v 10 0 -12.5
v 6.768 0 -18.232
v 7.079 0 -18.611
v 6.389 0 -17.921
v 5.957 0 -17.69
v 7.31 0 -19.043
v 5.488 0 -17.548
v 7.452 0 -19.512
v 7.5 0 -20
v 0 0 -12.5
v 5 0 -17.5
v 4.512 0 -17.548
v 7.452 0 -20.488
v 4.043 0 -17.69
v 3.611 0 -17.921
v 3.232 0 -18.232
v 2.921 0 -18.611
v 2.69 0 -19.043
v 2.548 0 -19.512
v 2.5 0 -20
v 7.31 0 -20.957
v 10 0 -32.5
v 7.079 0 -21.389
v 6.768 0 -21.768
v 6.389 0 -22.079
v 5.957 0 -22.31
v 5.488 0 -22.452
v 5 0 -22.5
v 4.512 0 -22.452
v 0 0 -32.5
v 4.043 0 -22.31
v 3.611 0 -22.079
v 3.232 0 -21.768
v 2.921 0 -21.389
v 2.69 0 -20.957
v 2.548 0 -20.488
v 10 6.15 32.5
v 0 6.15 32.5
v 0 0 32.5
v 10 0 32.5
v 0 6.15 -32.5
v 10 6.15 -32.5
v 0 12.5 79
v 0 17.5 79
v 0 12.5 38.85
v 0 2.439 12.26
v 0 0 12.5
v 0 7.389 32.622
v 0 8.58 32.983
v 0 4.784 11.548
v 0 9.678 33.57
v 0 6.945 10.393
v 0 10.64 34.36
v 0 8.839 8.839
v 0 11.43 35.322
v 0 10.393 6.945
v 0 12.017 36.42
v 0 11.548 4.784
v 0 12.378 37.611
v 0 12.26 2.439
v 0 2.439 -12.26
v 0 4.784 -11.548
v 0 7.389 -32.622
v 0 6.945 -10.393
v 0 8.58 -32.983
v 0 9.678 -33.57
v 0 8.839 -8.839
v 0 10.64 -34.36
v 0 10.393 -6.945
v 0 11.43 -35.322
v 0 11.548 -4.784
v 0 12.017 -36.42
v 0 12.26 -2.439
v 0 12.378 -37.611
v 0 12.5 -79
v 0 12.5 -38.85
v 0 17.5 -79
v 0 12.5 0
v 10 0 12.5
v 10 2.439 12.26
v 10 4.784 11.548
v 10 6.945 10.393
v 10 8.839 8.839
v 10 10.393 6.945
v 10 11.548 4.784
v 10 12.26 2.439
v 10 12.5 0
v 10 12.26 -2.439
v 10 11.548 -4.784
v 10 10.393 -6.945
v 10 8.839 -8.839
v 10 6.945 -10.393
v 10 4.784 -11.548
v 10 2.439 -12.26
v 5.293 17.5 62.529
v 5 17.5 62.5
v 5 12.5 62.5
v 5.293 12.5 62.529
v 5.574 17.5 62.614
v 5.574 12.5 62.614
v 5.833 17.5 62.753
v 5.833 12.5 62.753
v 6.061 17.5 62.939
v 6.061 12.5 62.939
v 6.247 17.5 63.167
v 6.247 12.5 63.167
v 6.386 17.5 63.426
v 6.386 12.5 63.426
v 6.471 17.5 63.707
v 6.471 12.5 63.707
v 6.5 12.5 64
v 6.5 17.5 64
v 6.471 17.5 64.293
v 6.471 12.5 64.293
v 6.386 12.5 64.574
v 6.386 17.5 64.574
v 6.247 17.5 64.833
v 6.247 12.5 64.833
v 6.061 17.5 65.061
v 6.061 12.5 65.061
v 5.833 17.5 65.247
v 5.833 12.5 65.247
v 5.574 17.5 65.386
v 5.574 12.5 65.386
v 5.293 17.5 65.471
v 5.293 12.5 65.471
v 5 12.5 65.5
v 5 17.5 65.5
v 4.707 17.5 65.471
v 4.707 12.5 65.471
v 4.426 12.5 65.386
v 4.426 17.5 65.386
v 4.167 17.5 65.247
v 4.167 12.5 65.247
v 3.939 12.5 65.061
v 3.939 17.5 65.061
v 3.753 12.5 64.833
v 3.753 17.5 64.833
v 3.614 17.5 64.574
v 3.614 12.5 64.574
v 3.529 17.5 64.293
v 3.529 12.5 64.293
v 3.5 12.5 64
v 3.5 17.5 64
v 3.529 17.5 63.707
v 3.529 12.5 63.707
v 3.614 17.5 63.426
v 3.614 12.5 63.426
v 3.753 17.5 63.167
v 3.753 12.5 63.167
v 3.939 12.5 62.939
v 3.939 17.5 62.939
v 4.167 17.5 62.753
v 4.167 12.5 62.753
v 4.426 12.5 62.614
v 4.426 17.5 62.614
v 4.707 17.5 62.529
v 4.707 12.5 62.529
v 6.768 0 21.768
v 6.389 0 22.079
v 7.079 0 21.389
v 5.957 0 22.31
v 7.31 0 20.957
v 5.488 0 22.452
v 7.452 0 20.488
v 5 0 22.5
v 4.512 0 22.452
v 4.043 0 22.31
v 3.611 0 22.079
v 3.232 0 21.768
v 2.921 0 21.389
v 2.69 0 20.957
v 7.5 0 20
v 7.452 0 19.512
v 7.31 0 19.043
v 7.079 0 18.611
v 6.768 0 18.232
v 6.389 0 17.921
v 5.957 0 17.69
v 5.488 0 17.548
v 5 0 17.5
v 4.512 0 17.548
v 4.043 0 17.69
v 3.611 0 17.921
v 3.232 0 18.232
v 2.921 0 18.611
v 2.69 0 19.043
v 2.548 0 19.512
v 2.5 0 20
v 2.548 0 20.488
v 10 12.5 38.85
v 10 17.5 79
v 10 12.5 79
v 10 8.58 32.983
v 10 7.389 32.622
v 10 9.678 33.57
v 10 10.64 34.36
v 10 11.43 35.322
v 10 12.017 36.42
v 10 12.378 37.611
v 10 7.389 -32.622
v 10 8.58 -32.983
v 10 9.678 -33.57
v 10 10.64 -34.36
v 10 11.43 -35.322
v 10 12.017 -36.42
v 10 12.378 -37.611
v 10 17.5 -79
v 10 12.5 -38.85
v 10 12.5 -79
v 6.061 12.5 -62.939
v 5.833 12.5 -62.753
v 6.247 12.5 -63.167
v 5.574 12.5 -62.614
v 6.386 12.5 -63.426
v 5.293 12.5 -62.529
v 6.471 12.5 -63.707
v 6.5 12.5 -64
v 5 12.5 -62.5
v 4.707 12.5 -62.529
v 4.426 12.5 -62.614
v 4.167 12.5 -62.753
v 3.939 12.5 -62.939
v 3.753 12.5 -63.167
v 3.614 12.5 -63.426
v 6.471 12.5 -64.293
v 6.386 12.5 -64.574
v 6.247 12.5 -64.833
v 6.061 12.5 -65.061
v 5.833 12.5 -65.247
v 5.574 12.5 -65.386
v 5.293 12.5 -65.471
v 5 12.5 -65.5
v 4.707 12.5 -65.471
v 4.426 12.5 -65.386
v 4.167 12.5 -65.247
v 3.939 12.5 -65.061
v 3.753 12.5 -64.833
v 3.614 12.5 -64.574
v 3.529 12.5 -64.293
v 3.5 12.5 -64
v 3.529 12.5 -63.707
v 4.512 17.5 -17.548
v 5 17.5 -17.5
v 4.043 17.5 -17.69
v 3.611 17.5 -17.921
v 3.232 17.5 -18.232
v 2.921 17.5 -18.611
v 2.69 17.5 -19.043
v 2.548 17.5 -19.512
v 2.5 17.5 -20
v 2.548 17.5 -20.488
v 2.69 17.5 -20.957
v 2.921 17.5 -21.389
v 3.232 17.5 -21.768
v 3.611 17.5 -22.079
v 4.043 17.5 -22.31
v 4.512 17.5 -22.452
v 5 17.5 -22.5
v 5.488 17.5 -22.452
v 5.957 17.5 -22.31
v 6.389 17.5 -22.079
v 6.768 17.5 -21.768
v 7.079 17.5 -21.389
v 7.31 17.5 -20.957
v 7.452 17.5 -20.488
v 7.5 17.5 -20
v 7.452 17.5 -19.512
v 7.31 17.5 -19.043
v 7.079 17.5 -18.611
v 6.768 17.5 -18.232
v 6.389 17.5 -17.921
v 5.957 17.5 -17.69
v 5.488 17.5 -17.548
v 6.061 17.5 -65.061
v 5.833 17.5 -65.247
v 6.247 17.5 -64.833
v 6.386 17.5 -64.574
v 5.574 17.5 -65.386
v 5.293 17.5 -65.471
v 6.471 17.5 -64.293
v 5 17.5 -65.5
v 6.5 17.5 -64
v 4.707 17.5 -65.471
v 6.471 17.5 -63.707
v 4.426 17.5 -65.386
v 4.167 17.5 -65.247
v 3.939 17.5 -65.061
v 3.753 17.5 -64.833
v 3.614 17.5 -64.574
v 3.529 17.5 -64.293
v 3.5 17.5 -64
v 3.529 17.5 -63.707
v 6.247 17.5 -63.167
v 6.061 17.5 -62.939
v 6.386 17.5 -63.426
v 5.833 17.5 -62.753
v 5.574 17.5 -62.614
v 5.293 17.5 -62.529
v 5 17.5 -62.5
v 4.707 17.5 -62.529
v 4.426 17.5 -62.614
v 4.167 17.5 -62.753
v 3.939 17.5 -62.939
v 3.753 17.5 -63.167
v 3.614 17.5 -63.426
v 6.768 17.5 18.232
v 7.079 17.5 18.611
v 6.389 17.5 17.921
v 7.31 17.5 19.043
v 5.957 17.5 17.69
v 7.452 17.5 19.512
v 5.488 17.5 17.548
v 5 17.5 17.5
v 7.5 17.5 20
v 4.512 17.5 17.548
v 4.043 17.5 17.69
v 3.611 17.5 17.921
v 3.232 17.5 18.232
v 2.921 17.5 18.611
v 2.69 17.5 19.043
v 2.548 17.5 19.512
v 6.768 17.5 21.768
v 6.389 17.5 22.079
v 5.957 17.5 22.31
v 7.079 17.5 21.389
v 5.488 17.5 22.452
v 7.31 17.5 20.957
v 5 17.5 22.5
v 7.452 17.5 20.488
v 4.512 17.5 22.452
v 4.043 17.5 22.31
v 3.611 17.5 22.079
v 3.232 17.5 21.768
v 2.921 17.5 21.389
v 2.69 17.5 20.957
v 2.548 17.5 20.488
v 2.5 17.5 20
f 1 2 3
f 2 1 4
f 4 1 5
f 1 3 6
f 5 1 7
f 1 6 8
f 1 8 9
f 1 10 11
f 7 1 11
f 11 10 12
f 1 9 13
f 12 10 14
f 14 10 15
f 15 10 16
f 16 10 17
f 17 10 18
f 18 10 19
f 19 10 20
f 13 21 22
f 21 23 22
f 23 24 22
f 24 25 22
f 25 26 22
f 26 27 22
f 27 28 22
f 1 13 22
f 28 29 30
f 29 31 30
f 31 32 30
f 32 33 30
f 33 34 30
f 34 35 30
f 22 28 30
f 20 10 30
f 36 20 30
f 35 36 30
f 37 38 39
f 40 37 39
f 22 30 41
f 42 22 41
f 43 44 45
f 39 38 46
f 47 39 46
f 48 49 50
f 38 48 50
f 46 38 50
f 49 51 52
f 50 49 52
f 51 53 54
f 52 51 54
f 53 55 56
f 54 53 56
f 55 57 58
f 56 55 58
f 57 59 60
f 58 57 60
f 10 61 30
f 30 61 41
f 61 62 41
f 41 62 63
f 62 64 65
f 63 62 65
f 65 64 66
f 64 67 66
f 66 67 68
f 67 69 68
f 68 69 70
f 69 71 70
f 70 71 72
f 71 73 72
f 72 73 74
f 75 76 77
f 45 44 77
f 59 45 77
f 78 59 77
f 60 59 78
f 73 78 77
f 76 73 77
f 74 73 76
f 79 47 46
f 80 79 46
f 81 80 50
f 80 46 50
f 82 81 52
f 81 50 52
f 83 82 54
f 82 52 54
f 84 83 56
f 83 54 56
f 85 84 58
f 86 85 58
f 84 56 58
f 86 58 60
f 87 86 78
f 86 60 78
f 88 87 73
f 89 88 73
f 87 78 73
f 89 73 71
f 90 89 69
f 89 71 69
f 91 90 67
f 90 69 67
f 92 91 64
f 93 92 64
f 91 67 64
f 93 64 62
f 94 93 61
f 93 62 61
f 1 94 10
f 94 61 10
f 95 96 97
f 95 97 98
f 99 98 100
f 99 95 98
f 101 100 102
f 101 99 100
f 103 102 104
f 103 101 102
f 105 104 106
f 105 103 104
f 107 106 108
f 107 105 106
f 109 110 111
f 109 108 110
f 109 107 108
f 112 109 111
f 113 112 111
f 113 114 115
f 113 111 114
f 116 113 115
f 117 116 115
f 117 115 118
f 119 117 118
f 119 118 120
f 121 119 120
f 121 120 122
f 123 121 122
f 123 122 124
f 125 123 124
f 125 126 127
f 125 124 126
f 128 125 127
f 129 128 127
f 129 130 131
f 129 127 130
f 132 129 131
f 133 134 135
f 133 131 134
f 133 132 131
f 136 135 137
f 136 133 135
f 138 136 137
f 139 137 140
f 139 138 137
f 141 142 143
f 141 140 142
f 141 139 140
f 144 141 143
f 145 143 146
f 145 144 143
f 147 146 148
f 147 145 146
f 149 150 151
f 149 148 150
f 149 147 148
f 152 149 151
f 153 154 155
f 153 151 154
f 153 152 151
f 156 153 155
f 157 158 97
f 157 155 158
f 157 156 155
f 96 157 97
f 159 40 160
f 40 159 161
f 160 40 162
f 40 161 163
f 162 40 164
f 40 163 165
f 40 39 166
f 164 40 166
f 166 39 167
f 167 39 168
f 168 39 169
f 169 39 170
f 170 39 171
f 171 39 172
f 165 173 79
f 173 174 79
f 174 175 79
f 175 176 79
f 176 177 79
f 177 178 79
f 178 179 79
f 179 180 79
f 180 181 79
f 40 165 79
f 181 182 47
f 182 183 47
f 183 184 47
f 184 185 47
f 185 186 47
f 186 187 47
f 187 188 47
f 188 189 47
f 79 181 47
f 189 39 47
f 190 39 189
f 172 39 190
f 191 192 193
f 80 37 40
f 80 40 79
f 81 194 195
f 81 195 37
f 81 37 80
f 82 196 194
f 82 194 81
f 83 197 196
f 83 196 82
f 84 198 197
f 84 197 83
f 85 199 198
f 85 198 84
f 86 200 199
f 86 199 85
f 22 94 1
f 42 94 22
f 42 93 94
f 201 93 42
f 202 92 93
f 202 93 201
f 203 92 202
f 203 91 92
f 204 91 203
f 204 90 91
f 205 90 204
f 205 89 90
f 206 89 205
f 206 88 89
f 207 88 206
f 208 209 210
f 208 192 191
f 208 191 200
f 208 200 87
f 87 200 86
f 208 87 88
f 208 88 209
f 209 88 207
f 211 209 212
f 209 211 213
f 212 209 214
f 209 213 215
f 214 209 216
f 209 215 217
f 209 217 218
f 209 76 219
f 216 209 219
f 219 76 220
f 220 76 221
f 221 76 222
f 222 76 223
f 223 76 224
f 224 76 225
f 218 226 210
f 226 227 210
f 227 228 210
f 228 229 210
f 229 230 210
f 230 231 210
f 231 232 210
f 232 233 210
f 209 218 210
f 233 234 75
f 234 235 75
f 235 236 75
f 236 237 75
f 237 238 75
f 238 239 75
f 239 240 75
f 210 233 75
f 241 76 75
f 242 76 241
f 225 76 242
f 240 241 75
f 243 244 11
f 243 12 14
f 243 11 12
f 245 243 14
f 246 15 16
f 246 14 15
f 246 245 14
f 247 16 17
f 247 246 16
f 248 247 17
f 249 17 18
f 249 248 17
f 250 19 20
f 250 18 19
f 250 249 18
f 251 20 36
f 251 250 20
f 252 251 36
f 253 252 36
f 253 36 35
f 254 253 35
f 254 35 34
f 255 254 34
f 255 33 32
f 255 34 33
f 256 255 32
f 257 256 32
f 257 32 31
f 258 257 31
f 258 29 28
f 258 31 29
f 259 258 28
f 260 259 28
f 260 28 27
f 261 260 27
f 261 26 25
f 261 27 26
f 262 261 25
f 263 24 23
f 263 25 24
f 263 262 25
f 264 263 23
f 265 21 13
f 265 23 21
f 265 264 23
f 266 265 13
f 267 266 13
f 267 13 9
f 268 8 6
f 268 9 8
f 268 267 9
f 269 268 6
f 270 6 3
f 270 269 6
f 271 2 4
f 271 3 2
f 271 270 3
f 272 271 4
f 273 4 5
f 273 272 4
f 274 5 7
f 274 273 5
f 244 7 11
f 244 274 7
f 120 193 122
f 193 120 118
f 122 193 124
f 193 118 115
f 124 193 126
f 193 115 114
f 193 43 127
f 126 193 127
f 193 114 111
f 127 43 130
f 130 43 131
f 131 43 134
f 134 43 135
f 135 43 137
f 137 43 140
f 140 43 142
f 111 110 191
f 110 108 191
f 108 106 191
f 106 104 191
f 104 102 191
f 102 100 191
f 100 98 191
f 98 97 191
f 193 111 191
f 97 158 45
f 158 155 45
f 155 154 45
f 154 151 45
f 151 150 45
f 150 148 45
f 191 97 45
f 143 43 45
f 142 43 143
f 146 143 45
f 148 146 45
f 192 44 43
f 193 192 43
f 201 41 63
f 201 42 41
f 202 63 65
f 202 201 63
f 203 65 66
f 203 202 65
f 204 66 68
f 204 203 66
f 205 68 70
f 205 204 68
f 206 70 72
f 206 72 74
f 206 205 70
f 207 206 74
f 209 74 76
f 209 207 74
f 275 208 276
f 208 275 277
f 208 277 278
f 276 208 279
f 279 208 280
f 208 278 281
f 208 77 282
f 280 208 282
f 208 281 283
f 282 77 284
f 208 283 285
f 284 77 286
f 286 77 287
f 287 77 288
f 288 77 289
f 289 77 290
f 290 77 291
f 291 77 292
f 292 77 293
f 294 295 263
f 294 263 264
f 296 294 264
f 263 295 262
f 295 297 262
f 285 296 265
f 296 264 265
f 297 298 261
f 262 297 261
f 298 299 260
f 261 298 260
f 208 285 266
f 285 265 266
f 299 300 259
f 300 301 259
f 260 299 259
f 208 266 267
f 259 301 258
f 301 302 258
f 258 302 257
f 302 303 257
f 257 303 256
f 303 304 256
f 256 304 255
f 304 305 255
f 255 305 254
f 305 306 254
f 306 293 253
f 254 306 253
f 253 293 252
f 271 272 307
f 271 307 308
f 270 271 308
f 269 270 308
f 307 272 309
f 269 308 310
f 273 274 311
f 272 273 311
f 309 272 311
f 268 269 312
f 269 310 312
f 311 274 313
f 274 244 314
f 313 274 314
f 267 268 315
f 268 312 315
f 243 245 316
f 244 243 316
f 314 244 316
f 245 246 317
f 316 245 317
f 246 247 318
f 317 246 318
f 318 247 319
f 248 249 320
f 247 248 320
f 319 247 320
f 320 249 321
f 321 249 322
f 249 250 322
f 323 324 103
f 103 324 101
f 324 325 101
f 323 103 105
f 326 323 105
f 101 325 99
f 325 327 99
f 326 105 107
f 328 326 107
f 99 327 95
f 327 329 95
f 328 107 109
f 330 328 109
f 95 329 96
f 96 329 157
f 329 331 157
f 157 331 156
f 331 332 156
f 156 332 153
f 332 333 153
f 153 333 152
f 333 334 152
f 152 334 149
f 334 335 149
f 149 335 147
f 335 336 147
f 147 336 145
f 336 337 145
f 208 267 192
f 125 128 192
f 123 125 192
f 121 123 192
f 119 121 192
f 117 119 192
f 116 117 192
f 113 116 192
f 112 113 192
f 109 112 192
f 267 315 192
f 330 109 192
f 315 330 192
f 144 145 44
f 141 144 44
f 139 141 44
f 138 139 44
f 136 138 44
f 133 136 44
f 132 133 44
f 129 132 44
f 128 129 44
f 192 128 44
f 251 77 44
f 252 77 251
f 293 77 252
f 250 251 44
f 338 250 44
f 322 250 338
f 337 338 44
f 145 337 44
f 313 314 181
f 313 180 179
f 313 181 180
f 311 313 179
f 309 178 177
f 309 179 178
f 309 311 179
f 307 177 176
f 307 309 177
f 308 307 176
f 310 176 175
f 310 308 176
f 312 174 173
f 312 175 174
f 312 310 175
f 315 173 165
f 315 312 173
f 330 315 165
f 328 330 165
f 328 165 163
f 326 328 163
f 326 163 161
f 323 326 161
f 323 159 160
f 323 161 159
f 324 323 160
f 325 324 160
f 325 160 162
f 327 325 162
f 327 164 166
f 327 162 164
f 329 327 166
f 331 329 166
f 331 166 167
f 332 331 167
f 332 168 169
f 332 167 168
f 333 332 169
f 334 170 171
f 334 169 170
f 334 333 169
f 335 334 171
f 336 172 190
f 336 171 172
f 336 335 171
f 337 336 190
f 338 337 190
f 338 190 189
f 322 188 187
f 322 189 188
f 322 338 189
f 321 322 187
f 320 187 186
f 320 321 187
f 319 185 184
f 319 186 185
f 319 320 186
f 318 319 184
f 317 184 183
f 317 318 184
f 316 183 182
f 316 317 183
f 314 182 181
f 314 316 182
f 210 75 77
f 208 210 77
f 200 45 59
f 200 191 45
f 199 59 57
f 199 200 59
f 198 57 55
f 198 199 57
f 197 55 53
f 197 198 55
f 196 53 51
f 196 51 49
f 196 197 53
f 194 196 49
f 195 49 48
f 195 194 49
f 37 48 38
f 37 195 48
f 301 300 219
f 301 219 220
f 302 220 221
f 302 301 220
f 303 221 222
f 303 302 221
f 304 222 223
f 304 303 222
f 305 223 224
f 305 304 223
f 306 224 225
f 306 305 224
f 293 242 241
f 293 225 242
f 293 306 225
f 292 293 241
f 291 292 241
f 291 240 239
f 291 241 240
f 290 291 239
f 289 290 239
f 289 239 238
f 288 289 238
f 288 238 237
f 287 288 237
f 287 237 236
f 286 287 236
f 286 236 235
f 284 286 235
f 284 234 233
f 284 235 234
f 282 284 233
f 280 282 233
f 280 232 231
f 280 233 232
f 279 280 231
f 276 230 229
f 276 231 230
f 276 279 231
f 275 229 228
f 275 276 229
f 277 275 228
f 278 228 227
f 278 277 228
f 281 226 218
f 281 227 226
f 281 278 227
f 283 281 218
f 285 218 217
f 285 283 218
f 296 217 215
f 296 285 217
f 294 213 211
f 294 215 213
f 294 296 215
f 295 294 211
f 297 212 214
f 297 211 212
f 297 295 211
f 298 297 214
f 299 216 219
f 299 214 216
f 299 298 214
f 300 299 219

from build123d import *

# Parameters (mm, degrees)
BOSS_EXTRUDE1_DEPTH     = 10
CUT_EXTRUDE1_DEPTH      = 81.605520903
CUT_EXTRUDE1_DEPTH_BACK = 81.605520903
SKETCH2_R               = 1.5
SKETCH2_R_2             = 2.5
FILLET1_R               = 6.35


with BuildPart() as part:
    # Sketch1 → Boss-Extrude1 (new body)
    with BuildSketch(Plane(origin=(0, 0, 0), x_dir=(0, 0, -1), z_dir=(1, 0, 0))):
        with BuildLine():
            Line((-79, 12.5), (-32.5, 12.5))
            Line((-32.5, 12.5), (-32.5, 0))
            Line((-32.5, 0), (-12.5, 0))
            ThreePointArc((-12.5, 0), (0, 12.5), (12.5, 0))
            Line((12.5, 0), (32.5, 0))
            Line((32.5, 0), (32.5, 12.5))
            Line((32.5, 12.5), (79, 12.5))
            Line((79, 12.5), (79, 17.5))
            Line((79, 17.5), (-79, 17.5))
            Line((-79, 17.5), (-79, 12.5))
        make_face()
    extrude(amount=BOSS_EXTRUDE1_DEPTH)

    # Sketch2 → Cut-Extrude1 (cut, two sides: drawn at the far end of the back side and taken through both)
    with BuildSketch(Plane.XZ.offset(-12.5).offset(-CUT_EXTRUDE1_DEPTH_BACK)):
        with Locations(Location((5, 64, 0), (0, 0, 270))):
            Circle(SKETCH2_R)
        with Locations(Location((5, -64, 0), (0, 0, 90))):
            Circle(SKETCH2_R)
        with Locations(Location((5, 20, 0), (0, 0, 270))):
            Circle(SKETCH2_R_2)
        with Locations(Location((5, -20, 0), (0, 0, 90))):
            Circle(SKETCH2_R_2)
    extrude(amount=CUT_EXTRUDE1_DEPTH + CUT_EXTRUDE1_DEPTH_BACK, mode=Mode.SUBTRACT)

    # Fillet1
    fillet1_edges = [part.edges().sort_by_distance(p)[0] for p in [
        (5, 12.5, 32.5),
        (5, 12.5, -32.5),
    ]]
    fillet(fillet1_edges, radius=FILLET1_R)


solid = part.part
